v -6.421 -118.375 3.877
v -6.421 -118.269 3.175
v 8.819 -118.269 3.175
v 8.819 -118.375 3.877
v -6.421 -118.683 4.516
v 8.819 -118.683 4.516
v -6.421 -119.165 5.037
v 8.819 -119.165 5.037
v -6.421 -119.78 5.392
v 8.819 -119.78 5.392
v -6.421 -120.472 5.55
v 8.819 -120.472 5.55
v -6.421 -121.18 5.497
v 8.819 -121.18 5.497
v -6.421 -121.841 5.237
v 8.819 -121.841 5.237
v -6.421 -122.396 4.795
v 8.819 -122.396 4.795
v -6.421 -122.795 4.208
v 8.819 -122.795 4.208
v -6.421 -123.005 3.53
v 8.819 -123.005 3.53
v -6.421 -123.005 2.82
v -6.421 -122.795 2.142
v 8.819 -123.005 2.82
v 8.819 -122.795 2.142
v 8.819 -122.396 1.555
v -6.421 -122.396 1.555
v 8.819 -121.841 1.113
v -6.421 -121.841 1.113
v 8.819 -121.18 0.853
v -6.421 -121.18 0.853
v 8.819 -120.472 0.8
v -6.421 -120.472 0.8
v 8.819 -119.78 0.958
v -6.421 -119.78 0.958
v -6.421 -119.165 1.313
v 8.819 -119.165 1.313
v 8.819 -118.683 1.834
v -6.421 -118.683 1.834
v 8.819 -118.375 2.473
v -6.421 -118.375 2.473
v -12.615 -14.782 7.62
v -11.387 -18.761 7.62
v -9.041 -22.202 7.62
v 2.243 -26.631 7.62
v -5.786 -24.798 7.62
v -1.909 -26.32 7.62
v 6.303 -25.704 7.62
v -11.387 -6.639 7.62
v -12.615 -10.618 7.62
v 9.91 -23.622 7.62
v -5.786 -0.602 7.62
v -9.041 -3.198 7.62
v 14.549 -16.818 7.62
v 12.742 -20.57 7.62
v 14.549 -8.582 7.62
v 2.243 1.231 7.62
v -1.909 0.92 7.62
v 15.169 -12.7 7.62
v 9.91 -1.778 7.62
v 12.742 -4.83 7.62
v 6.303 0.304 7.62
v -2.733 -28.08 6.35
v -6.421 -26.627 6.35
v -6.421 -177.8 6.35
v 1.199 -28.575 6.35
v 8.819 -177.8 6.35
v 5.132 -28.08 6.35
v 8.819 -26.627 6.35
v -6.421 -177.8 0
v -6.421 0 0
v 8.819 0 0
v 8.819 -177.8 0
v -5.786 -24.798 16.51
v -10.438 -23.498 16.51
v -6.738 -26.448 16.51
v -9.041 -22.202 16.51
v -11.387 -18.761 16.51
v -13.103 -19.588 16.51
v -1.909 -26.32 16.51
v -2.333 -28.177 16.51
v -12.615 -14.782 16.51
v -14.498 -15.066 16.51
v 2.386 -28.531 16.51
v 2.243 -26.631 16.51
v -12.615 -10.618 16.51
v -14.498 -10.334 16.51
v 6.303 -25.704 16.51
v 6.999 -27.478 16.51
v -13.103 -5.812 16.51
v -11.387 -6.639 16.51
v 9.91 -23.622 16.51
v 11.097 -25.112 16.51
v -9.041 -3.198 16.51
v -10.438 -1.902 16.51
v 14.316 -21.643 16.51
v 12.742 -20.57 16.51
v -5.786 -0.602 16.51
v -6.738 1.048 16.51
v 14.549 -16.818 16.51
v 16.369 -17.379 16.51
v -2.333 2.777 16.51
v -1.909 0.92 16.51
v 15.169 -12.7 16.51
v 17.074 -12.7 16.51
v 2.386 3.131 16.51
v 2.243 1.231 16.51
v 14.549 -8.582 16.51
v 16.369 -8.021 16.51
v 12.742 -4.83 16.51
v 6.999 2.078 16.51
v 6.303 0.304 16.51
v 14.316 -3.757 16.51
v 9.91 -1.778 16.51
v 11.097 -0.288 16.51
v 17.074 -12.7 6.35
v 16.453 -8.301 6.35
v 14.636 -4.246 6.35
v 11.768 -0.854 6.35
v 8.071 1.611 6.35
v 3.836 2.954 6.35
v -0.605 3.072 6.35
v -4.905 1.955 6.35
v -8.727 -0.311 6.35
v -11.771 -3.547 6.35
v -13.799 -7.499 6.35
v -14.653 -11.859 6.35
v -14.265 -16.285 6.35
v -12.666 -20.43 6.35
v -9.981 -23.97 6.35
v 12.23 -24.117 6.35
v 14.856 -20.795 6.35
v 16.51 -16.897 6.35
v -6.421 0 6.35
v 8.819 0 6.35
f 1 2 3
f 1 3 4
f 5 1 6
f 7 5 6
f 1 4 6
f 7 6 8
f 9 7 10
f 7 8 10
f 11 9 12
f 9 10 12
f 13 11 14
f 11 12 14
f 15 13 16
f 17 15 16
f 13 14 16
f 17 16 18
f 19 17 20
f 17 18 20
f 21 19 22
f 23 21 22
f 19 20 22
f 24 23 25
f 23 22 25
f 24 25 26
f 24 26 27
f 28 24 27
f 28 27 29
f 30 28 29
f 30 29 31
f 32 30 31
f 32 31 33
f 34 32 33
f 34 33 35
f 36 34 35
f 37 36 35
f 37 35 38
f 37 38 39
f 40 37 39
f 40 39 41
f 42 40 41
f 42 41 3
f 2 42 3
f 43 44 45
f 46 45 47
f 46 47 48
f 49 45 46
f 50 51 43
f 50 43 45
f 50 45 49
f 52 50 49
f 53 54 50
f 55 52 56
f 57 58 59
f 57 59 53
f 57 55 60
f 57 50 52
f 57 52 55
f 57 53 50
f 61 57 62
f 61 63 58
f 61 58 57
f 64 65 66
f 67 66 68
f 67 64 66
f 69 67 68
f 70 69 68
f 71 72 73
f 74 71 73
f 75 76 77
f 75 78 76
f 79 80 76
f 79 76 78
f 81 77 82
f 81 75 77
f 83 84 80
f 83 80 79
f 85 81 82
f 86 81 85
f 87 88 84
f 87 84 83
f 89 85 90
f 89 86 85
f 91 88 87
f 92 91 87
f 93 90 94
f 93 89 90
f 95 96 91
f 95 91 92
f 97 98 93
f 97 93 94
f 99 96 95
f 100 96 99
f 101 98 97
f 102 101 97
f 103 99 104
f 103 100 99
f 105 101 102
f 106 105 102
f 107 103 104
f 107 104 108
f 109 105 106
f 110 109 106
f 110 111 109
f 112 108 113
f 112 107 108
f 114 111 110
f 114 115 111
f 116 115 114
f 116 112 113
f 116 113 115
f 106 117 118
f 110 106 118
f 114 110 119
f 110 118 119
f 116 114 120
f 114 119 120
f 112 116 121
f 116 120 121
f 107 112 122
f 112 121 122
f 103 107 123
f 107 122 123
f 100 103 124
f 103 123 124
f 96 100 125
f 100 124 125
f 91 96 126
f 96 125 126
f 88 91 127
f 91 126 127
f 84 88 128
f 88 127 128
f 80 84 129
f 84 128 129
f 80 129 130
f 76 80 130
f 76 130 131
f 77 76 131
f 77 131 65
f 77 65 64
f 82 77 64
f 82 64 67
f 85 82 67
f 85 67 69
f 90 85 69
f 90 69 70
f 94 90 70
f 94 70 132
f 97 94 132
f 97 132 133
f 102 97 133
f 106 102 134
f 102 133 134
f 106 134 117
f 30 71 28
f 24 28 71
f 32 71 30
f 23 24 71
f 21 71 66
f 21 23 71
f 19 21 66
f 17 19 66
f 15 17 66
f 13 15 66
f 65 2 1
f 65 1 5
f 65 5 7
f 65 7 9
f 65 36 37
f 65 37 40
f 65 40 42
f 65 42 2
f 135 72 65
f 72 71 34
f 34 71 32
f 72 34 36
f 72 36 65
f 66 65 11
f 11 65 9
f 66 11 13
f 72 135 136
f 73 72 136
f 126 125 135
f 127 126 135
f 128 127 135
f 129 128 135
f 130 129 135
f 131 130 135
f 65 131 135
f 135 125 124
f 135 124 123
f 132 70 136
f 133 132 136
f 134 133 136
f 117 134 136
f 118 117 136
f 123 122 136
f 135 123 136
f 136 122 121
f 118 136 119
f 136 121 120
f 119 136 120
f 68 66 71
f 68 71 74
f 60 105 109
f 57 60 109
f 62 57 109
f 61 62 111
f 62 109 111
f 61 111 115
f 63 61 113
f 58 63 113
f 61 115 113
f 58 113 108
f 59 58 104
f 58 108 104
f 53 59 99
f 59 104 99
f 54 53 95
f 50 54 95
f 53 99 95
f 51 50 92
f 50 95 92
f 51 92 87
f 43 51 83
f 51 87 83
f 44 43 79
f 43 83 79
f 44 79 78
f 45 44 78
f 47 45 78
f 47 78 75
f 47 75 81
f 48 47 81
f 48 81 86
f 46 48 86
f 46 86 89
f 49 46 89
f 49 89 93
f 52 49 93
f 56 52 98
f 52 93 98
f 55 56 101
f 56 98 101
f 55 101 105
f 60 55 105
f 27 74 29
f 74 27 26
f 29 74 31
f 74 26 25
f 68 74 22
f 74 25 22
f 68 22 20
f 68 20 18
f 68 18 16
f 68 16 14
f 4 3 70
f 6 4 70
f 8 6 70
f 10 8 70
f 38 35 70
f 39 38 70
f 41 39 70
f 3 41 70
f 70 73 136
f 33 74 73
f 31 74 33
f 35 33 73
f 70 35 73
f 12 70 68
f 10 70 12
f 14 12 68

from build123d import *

# Parameters (mm, degrees)
F0_W     = 15.24
F0_H     = 6.35
F1_DEPTH = 177.8
F2_R     = 2.38125
F3_DEPTH = 15.241
F4_R     = 15.875
F5_DEPTH = 10.16
F6_R     = 13.97
F7_DEPTH = 8.89


with BuildPart() as f1:
    # F0 (on Front) → F1 (new body)
    with BuildSketch(Plane.XZ):
        with Locations((1.199444, 3.175)):
            Rectangle(F0_W, F0_H)
    extrude(amount=F1_DEPTH)

    # F2 (on face) → F3 (cut, through all)
    with BuildSketch(Plane.YZ.offset(8.819444)):
        with Locations((-120.65, 3.175)):
            Circle(F2_R)
    extrude(amount=-F3_DEPTH, mode=Mode.SUBTRACT)

    # F4 (on face) → F5 (join)
    with BuildSketch(Plane.XY.offset(6.35)):
        with Locations((1.199444, -12.7)):
            Circle(F4_R)
    extrude(amount=F5_DEPTH)

    # F6 (on face) → F7 (cut)
    with BuildSketch(Plane.XY.offset(16.51)):
        with Locations((1.199444, -12.7)):
            Circle(F6_R)
    extrude(amount=-F7_DEPTH, mode=Mode.SUBTRACT)


solid = f1.part
